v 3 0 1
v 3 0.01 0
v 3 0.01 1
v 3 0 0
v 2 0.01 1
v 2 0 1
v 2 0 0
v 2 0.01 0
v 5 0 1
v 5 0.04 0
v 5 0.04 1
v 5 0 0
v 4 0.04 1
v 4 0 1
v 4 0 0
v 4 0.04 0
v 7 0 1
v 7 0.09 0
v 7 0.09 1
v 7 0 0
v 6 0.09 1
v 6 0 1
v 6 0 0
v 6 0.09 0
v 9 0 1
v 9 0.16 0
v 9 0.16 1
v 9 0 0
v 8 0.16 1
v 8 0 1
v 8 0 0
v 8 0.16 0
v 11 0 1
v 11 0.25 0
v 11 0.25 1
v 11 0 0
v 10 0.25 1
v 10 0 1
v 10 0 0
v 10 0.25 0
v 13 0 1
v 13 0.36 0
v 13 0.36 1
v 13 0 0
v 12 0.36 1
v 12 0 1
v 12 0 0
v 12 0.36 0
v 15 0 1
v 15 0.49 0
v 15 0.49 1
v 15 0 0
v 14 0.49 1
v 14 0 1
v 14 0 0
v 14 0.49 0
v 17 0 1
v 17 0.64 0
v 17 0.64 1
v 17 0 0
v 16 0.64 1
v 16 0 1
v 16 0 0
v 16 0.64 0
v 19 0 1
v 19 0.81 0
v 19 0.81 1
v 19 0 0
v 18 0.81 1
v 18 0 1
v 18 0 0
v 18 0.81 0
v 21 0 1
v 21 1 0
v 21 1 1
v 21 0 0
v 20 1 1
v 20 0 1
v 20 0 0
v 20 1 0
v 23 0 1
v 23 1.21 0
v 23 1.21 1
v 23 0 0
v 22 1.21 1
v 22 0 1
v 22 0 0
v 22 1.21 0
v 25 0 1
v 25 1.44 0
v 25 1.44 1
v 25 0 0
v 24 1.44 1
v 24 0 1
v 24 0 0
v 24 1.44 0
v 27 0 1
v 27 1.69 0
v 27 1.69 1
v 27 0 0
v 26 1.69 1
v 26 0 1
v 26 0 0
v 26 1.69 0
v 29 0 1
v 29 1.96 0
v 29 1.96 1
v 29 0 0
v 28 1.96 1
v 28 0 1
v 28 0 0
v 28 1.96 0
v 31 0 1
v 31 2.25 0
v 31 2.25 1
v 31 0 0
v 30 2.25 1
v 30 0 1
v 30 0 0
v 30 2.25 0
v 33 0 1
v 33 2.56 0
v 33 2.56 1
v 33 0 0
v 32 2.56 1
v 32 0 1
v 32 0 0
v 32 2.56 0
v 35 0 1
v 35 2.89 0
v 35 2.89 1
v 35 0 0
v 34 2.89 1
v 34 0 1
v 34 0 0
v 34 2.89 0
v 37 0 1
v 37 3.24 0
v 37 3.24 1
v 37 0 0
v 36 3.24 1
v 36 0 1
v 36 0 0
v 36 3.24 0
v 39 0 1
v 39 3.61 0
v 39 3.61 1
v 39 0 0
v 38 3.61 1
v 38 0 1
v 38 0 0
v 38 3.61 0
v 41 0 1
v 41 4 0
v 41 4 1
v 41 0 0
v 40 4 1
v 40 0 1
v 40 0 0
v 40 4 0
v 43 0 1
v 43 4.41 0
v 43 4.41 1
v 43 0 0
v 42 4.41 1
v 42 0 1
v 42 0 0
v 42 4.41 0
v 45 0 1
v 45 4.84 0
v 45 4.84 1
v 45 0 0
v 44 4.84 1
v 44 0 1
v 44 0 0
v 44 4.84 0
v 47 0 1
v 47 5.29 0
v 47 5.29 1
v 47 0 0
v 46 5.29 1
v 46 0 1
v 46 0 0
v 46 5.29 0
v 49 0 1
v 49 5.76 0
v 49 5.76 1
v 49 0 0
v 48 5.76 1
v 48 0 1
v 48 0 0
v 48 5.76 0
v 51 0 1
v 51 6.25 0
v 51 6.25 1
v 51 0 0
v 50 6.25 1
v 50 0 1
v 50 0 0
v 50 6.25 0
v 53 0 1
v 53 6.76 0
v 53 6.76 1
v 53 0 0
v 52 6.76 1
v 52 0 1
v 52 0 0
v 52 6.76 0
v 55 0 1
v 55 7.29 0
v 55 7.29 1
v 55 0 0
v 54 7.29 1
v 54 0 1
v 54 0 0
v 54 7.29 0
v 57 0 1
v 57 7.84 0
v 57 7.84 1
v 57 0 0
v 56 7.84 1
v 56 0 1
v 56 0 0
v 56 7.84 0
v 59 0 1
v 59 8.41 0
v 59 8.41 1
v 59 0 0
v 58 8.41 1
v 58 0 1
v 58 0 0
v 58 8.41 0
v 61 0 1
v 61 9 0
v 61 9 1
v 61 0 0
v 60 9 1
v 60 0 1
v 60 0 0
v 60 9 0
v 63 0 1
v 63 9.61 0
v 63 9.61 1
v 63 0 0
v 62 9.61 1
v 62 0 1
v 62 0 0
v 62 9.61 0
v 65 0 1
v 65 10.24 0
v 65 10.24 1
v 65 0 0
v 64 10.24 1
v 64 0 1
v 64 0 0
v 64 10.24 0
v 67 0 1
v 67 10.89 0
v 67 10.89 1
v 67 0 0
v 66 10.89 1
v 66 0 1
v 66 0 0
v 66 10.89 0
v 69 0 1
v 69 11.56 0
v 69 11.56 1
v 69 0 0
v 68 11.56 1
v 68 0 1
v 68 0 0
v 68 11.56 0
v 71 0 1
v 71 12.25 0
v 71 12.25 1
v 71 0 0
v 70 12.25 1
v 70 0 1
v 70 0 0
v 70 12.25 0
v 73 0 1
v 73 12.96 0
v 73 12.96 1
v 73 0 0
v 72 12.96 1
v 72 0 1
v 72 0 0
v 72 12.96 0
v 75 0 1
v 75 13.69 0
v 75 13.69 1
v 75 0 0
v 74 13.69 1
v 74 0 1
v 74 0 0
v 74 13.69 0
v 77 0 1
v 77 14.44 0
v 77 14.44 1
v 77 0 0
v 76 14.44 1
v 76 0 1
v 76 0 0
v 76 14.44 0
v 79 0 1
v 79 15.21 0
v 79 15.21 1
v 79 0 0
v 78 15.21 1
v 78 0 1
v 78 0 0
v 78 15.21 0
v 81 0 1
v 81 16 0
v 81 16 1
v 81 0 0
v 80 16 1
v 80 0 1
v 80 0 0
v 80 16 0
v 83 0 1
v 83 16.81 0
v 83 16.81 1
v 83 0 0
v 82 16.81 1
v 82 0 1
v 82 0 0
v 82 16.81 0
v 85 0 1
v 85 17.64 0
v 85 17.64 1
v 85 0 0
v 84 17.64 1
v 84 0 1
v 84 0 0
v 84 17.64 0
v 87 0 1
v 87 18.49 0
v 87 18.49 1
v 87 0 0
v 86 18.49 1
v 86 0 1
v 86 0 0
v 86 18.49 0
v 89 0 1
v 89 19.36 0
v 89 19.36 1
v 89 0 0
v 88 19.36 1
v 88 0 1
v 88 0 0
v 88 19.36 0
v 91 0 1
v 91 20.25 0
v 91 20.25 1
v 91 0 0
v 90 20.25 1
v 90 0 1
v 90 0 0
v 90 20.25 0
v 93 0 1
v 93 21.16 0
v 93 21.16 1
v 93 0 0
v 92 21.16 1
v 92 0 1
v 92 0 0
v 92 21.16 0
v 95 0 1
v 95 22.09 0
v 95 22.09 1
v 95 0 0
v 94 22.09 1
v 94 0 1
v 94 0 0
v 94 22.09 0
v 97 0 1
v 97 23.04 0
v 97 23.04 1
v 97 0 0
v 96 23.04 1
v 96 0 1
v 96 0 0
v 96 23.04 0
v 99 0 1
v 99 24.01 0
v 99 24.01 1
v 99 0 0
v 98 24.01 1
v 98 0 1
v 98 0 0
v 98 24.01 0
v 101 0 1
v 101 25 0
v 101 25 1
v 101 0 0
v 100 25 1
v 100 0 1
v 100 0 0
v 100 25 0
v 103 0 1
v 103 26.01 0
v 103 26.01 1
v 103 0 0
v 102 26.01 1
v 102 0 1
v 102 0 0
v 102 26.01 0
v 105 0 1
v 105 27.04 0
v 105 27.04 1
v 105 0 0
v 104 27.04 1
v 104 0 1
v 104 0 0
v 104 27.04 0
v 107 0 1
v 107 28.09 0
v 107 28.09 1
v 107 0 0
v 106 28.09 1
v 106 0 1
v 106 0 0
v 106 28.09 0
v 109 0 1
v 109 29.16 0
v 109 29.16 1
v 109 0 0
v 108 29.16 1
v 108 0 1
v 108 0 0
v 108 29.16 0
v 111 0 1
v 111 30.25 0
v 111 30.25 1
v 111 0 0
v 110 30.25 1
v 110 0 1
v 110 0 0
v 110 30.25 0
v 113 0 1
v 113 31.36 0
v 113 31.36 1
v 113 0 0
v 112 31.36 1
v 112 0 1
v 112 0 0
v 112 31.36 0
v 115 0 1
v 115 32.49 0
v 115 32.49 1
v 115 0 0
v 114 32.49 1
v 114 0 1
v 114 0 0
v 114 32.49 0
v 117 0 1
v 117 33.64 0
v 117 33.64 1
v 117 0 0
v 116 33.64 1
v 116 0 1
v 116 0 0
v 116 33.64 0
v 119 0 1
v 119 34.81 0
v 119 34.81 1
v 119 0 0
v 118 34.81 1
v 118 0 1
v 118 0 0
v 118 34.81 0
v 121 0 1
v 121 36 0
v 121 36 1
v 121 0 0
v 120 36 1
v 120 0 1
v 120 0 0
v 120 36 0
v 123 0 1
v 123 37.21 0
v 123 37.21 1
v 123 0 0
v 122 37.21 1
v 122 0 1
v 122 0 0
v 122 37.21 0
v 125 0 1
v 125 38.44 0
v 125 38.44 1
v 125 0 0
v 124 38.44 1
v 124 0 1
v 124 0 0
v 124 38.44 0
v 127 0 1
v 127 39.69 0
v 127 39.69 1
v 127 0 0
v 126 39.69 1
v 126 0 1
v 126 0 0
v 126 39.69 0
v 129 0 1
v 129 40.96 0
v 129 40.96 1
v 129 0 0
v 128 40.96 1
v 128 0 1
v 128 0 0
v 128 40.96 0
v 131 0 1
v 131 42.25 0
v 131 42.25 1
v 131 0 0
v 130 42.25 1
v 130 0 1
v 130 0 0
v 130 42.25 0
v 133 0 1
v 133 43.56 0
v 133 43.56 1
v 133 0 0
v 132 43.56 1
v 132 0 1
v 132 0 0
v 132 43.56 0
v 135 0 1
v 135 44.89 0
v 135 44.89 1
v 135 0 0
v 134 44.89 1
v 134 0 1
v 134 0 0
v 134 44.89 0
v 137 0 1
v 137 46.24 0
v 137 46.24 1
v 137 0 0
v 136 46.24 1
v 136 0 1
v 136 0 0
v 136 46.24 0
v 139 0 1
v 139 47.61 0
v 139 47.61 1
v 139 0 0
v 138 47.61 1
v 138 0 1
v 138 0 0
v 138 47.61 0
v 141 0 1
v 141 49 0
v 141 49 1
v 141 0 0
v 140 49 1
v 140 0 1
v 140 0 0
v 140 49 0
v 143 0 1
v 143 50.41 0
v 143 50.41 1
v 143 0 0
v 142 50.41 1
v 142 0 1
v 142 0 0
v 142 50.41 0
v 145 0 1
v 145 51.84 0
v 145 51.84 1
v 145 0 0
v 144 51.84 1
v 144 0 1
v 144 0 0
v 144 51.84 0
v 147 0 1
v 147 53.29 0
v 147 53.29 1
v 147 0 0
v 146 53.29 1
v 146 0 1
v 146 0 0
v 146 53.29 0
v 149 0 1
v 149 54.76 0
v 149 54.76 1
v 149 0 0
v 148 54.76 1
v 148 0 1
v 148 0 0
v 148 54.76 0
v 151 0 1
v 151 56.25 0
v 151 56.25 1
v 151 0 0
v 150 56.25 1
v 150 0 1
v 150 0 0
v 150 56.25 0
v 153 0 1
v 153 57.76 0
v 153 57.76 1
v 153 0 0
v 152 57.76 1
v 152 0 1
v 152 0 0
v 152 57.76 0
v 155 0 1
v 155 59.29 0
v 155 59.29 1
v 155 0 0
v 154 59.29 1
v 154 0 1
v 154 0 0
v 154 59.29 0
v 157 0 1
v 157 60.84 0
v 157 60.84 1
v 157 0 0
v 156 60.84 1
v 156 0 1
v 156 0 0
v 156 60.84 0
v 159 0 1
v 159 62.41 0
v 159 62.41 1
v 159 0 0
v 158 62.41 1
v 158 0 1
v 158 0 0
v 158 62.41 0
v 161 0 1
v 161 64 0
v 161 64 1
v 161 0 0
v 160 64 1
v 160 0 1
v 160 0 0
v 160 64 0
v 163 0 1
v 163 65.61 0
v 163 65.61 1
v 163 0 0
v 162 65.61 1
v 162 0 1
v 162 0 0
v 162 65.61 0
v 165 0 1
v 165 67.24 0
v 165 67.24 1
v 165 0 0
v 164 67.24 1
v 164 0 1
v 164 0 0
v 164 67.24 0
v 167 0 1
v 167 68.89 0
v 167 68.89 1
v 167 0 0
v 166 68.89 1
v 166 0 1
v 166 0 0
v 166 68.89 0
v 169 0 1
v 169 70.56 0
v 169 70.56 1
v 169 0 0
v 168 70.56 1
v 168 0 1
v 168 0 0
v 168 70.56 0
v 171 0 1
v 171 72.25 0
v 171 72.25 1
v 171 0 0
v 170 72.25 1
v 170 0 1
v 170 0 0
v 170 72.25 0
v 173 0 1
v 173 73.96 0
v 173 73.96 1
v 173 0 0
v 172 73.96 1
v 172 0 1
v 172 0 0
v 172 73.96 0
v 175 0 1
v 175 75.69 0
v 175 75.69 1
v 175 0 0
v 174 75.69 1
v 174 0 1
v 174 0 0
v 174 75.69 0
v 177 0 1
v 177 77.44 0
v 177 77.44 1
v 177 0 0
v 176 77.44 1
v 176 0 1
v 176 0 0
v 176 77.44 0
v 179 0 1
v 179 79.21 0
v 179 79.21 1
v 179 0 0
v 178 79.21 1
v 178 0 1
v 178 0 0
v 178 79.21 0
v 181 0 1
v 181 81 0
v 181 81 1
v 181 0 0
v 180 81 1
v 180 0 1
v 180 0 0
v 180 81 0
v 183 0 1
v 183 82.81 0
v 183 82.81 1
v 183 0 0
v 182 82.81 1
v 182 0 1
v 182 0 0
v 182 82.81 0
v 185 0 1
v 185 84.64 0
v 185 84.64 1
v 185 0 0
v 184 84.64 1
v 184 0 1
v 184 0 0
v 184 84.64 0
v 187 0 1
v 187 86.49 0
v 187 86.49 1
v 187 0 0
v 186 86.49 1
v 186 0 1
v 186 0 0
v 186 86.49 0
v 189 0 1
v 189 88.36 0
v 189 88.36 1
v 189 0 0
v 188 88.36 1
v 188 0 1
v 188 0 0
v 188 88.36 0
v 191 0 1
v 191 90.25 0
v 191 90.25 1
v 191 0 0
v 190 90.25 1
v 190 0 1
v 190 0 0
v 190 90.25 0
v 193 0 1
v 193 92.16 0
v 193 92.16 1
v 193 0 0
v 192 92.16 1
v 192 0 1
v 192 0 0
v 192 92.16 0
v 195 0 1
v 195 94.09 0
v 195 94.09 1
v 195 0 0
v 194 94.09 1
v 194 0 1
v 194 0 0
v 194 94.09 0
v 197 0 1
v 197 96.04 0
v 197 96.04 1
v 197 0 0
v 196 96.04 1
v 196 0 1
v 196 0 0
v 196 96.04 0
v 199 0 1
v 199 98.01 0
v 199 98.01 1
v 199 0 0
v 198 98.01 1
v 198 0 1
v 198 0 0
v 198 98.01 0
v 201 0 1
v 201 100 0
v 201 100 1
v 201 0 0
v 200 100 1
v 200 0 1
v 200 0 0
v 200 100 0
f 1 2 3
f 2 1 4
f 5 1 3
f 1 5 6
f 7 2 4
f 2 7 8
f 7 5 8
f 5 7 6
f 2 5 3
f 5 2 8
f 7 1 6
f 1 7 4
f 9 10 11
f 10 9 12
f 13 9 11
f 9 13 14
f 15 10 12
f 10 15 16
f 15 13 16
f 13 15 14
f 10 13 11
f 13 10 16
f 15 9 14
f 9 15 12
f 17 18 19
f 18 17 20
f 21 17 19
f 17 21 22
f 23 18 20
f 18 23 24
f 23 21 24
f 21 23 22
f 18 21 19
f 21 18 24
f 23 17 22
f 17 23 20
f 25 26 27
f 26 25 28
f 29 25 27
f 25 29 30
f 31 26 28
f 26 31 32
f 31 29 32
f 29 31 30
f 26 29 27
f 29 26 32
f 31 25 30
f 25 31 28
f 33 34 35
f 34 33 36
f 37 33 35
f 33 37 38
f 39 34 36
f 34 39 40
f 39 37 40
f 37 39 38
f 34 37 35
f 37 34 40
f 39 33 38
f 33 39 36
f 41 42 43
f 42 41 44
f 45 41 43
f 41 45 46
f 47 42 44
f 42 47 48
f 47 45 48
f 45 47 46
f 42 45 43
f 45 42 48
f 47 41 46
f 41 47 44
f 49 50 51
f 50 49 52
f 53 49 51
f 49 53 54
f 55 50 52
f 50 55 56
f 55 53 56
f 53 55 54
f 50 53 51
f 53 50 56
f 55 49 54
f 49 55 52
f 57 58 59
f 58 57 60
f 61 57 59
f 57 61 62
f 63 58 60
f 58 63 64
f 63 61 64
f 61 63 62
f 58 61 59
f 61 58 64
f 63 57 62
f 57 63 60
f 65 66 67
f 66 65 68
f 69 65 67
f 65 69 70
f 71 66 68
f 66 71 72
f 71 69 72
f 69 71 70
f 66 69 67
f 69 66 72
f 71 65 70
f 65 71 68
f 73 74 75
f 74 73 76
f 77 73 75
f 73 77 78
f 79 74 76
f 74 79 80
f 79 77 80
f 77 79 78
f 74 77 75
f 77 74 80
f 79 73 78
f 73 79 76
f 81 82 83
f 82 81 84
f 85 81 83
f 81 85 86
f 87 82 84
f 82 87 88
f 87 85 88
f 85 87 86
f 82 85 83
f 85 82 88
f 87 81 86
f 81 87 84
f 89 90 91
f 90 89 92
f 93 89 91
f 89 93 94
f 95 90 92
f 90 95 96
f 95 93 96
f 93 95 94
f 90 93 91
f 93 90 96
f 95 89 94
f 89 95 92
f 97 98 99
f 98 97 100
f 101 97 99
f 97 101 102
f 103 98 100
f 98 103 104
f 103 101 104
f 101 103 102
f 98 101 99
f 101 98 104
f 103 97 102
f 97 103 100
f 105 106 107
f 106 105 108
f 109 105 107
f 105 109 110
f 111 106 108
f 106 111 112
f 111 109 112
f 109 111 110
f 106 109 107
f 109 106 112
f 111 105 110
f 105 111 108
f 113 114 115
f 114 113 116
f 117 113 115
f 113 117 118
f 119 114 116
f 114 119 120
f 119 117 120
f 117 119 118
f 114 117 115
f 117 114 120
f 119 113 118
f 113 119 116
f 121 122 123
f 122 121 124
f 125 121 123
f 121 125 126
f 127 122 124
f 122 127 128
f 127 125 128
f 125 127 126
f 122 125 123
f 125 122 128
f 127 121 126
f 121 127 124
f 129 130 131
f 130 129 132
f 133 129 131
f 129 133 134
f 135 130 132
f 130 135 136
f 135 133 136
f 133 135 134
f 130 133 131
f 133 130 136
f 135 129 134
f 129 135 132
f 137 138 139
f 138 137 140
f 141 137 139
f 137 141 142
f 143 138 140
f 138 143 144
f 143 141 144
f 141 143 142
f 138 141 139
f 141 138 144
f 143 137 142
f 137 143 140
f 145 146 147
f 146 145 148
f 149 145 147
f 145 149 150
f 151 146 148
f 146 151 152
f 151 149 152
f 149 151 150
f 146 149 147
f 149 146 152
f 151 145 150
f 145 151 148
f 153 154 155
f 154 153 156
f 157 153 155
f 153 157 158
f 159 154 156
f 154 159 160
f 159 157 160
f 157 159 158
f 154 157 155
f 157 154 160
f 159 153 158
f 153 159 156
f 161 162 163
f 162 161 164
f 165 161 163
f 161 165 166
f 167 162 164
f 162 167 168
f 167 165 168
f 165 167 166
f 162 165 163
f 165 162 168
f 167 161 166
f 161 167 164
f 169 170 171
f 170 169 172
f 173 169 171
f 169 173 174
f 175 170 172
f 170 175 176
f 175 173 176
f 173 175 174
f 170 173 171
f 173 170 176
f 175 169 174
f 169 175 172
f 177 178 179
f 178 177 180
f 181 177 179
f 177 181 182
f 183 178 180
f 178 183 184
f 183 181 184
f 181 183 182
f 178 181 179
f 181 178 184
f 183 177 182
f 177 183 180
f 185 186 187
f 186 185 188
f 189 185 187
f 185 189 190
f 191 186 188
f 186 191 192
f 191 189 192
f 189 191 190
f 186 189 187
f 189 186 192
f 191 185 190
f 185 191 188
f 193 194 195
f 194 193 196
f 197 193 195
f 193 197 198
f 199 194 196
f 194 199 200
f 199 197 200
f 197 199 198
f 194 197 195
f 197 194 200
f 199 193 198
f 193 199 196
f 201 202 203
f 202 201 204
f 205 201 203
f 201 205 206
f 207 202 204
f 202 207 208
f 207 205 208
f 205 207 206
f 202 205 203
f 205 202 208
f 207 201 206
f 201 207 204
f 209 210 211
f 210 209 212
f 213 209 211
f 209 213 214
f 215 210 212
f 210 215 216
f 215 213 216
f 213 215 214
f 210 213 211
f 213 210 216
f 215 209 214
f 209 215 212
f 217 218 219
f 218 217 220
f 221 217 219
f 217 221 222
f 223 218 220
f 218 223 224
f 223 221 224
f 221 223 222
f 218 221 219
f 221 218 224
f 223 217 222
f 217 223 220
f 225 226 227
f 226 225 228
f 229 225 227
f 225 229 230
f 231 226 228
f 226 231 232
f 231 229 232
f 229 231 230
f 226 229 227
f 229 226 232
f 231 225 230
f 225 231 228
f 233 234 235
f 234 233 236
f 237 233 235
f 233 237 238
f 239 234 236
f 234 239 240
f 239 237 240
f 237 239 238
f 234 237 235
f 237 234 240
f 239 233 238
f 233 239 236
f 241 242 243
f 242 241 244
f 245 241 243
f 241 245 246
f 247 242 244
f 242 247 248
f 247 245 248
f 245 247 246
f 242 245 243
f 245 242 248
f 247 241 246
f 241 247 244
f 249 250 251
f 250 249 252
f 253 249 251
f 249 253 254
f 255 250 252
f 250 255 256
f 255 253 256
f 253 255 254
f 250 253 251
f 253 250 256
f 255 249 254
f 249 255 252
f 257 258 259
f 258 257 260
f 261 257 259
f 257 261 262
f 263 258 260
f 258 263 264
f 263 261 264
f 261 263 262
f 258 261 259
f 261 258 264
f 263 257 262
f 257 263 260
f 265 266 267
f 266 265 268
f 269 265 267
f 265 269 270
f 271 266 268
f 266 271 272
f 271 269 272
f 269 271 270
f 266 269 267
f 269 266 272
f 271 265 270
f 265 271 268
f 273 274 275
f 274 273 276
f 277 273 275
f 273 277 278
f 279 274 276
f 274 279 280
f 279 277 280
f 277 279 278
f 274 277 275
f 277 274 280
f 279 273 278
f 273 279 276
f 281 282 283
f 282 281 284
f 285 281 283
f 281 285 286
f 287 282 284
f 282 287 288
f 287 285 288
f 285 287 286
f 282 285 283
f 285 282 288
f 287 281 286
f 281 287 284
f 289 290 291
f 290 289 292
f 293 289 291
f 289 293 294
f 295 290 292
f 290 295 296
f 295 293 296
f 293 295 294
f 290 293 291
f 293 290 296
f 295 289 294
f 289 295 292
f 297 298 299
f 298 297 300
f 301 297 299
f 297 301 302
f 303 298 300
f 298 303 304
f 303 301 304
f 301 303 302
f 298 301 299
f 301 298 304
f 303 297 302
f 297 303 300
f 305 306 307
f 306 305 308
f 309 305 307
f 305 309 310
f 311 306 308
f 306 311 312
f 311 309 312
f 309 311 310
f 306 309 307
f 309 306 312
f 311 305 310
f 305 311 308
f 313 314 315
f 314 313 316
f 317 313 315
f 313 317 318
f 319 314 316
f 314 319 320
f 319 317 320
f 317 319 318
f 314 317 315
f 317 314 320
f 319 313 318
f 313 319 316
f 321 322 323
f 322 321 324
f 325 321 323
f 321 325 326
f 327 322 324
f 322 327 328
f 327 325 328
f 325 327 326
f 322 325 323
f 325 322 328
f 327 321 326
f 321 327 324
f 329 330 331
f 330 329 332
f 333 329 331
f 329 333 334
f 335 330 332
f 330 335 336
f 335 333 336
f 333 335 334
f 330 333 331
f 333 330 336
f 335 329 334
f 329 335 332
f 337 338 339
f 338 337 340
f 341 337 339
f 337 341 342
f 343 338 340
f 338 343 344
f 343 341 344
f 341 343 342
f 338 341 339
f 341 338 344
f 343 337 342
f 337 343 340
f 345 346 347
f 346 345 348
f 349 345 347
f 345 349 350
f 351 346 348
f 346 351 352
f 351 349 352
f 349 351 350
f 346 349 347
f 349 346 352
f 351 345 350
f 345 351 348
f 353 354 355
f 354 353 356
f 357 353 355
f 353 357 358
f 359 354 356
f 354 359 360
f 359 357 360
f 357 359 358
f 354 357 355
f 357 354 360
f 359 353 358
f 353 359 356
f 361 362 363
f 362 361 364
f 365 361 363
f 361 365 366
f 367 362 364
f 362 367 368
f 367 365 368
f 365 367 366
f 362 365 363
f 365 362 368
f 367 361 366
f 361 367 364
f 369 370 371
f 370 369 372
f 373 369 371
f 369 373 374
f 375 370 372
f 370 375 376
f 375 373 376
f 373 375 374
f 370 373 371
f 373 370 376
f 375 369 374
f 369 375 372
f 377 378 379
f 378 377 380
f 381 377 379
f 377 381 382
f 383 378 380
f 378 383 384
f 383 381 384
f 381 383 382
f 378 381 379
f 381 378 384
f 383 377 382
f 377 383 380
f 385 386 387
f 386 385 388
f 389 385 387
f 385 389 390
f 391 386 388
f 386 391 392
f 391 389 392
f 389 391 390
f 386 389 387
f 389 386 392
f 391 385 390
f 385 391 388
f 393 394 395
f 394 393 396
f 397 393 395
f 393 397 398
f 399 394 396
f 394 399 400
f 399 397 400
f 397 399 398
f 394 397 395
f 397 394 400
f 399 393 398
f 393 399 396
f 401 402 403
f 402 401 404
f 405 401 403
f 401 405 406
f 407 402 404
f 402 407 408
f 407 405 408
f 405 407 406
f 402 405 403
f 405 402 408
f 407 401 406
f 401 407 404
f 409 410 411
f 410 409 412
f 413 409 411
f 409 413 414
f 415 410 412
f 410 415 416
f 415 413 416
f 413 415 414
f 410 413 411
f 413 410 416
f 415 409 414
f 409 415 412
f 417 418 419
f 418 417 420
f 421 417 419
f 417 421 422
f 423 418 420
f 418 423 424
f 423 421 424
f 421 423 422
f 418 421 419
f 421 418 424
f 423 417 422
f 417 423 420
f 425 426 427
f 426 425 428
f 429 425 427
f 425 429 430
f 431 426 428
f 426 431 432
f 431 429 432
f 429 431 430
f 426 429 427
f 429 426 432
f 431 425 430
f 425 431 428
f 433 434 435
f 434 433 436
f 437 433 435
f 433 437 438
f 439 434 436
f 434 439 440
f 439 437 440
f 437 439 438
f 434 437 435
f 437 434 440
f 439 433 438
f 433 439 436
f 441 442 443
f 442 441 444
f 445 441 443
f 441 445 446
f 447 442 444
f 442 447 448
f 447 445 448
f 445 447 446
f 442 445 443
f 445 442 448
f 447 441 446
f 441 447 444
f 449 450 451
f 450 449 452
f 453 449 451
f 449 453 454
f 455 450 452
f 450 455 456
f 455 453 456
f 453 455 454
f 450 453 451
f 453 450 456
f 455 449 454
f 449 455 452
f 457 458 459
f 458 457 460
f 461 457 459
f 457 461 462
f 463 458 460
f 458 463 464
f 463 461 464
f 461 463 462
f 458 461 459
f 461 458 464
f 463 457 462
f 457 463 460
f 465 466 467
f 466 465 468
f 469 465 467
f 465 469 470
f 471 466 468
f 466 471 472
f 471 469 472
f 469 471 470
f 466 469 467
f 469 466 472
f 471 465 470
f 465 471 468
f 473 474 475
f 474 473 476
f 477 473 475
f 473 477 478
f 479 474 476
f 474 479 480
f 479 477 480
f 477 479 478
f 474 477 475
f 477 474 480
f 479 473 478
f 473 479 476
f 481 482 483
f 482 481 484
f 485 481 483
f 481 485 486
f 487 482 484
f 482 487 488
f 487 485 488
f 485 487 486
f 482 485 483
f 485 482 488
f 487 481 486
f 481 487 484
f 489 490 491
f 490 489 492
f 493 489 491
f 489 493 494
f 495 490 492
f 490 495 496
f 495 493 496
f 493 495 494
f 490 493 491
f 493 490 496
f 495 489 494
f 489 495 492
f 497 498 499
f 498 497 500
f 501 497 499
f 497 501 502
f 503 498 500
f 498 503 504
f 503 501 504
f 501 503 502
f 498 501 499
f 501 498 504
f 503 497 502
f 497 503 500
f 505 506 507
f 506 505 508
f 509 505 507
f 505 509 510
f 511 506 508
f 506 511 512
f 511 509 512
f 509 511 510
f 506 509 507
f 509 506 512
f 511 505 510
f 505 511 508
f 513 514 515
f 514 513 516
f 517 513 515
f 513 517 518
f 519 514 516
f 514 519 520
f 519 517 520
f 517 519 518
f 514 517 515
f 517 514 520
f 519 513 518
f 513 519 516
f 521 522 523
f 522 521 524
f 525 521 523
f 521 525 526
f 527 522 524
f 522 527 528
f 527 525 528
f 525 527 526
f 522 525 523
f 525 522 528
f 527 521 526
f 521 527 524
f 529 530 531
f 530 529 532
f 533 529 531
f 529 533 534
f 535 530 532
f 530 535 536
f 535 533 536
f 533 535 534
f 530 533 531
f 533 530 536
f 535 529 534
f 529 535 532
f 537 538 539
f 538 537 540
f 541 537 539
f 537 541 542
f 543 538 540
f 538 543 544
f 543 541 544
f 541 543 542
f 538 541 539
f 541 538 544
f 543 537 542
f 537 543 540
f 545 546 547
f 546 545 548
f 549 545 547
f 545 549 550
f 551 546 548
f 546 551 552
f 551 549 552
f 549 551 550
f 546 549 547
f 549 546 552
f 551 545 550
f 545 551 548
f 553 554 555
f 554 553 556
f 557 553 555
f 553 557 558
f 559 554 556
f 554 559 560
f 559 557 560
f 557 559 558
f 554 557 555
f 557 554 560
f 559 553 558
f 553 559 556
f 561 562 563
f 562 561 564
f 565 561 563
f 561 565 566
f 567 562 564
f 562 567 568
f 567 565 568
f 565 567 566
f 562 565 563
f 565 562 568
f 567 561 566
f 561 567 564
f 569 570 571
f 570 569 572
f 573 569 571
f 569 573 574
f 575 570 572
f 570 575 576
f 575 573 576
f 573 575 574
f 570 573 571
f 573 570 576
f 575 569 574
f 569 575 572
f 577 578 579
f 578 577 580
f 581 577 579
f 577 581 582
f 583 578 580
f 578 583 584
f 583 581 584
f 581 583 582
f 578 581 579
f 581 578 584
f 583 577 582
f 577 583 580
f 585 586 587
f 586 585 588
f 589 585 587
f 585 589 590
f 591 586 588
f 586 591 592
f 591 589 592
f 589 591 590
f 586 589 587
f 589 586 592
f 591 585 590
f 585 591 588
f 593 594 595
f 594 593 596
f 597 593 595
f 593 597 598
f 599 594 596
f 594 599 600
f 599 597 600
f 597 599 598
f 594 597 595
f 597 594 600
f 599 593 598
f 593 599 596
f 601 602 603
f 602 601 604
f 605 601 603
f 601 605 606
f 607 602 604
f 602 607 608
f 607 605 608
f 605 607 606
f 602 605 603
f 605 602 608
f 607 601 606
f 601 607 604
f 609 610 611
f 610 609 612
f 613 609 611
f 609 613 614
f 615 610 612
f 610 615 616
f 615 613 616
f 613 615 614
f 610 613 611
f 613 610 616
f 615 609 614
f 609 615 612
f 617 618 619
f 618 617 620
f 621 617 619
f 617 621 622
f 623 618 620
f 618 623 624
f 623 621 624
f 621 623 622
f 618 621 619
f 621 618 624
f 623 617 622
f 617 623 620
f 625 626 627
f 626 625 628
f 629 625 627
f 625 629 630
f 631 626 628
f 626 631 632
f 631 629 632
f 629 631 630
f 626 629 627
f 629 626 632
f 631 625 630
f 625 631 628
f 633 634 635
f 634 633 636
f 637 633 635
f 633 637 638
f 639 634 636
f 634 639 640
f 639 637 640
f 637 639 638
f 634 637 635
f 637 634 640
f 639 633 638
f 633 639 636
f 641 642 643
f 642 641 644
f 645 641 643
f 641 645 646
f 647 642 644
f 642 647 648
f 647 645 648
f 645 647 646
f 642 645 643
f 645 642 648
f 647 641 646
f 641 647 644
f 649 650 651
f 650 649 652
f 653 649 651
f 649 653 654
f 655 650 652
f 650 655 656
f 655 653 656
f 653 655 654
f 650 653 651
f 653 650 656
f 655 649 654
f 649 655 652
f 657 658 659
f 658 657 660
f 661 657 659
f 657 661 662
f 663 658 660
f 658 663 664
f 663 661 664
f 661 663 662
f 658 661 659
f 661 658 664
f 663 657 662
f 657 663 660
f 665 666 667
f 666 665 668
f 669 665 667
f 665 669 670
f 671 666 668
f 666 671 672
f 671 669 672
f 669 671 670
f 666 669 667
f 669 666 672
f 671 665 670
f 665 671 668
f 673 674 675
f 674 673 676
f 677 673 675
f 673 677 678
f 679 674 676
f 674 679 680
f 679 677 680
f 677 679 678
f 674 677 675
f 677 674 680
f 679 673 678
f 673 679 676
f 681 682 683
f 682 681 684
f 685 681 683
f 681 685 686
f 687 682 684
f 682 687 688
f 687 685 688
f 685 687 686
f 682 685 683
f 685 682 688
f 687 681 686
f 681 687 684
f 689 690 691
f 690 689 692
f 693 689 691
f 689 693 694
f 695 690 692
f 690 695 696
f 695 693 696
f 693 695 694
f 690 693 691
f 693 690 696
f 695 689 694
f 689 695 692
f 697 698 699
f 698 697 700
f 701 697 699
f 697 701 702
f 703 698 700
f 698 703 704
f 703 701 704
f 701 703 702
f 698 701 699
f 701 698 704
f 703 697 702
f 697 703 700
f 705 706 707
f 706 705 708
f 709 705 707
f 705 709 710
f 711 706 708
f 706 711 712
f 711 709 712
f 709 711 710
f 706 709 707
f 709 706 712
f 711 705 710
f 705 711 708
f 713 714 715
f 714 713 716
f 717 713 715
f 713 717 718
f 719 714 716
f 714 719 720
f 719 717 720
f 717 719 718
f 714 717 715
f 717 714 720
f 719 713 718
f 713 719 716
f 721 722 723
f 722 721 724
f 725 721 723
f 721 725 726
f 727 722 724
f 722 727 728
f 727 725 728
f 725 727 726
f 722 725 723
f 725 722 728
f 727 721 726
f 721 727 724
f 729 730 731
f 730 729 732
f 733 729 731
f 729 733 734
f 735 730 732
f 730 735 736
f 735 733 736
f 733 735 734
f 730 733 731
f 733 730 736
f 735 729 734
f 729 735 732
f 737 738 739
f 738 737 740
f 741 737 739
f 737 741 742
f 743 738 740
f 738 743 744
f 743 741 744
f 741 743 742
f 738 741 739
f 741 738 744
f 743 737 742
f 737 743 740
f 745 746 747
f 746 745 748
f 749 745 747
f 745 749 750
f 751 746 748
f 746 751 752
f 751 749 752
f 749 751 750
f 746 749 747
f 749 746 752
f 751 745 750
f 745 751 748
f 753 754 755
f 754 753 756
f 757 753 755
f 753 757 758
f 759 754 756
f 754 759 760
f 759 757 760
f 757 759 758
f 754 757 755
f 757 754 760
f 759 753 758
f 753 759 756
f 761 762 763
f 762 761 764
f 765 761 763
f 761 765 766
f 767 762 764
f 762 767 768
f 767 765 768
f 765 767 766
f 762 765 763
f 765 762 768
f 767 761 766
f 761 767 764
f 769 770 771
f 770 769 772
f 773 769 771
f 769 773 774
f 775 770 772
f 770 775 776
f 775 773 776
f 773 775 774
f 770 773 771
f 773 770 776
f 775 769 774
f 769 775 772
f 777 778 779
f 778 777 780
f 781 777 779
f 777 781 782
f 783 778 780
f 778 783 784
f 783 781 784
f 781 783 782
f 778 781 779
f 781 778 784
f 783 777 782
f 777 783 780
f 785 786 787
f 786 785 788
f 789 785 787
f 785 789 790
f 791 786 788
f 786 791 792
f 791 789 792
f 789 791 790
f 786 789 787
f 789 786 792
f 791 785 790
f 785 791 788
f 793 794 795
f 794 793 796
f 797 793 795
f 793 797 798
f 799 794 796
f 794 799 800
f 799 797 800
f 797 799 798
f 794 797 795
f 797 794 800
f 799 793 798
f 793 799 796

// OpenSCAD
//------------------------------------------------------------------------------------------
// THIS CODE WAS GENERATED WITH GRAPHSCAD
//------------------------------------------------------------------------------------------
// F:/workspace/graphscad/graphscadfiles/variabledemo.scad
//------------------------------------------------------------------------------------------
// Graphscad is a graphical nodal editor to create .SCAD files
//
// More info here : http://graphscad.free.fr
//
// Scad Files created with Graphscad can be edited by graphscad
// Scad Files created with Graphscad can be read by Openscad
//
//------------------------------------------------------------------------------------------
module variabledemo()
{
 function node_variable_matrix(i=0,j=0,k=0,l=0,m=0,n=0) = node_variable0_matrix(i=i,j=j,k=k,l=l,m=m,n=n);
 module node_variable(i=0,j=0,k=0,l=0,m=0,n=0)
 {
  {
   $a=i;
   node_variable0(i,j,k,l,m,n);
  }
 }
 function node_variable0_matrix(i=0,j=0,k=0,l=0,m=0,n=0) = node_cube_matrix(i=i,j=j,k=k,l=l,m=m,n=n);
 module node_variable0(i=0,j=0,k=0,l=0,m=0,n=0)
 {
  {
   $b=$a/10*$a/10;
   node_cube(i,j,k,l,m,n);
  }
 }
 function node_cube_matrix(i=0,j=0,k=0,l=0,m=0,n=0) = translate([i*2,0,0]);
 module node_cube(i=0,j=0,k=0,l=0,m=0,n=0)
 {
  translate([i*2,0,0])cube([1,$b,1],center=false);
 }
 function node_for_matrix(i=0,j=0,k=0,l=0,m=0,n=0) = node_variable_matrix(i=i,j=j,k=k,l=l,m=m,n=n);
 module node_for(i=0,j=0,k=0,l=0,m=0,n=0)
 {
  for(i=[0:1:100])
  {
   node_variable(i,j,k,l,m,n);
  }
 }
 node_for();
 /*--------------------------------------------------------------------------------------------------------
  Graphscad Utils functions
  This code is Used By Graphscad Nodal Editor to generate SCAD files
 --------------------------------------------------------------------------------------------------------*/
 function det4x4(a) =
 a[0][0]*a[1][1]*a[2][2]*a[3][3] + a[0][0]*a[1][2]*a[2][3]*a[3][1] + a[0][0]*a[1][3]*a[2][1]*a[3][2]
 + a[0][1]*a[1][0]*a[2][3]*a[3][2] + a[0][1]*a[1][2]*a[2][0]*a[3][3] + a[0][1]*a[1][3]*a[2][2]*a[3][0]
 + a[0][2]*a[1][0]*a[2][1]*a[3][3] + a[0][2]*a[1][1]*a[2][3]*a[3][0] + a[0][2]*a[1][3]*a[2][0]*a[3][1]
 + a[0][3]*a[1][0]*a[2][2]*a[3][1] + a[0][3]*a[1][1]*a[2][0]*a[3][2] + a[0][3]*a[1][2]*a[2][1]*a[3][0]
 - a[0][0]*a[1][1]*a[2][3]*a[3][2] - a[0][0]*a[1][2]*a[2][1]*a[3][3] - a[0][0]*a[1][3]*a[2][2]*a[3][1]
 - a[0][1]*a[1][0]*a[2][2]*a[3][3] - a[0][1]*a[1][2]*a[2][3]*a[3][0] - a[0][1]*a[1][3]*a[2][0]*a[3][2]
 - a[0][2]*a[1][0]*a[2][3]*a[3][1] - a[0][2]*a[1][1]*a[2][0]*a[3][3] - a[0][2]*a[1][3]*a[2][1]*a[3][0]
 - a[0][3]*a[1][0]*a[2][1]*a[3][2] - a[0][3]*a[1][1]*a[2][2]*a[3][0] - a[0][3]*a[1][2]*a[2][0]*a[3][1];
 function invb00(a) = a[1][1]*a[2][2]*a[3][3] + a[1][2]*a[2][3]*a[3][1] + a[1][3]*a[2][1]*a[3][2] - a[1][1]*a[2][3]*a[3][2] - a[1][2]*a[2][1]*a[3][3] - a[1][3]*a[2][2]*a[3][1];
 function invb01(a) = a[0][1]*a[2][3]*a[3][2] + a[0][2]*a[2][1]*a[3][3] + a[0][3]*a[2][2]*a[3][1] - a[0][1]*a[2][2]*a[3][3] - a[0][2]*a[2][3]*a[3][1] - a[0][3]*a[2][1]*a[3][2];
 function invb02(a) = a[0][1]*a[1][2]*a[3][3] + a[0][2]*a[1][3]*a[3][1] + a[0][3]*a[1][1]*a[3][2] - a[0][1]*a[1][3]*a[3][2] - a[0][2]*a[1][1]*a[3][3] - a[0][3]*a[1][2]*a[3][1];
 function invb03(a) = a[0][1]*a[1][3]*a[2][2] + a[0][2]*a[1][1]*a[2][3] + a[0][3]*a[1][2]*a[2][1] - a[0][1]*a[1][2]*a[2][3] - a[0][2]*a[1][3]*a[2][1] - a[0][3]*a[1][1]*a[2][2];
 function invb10(a) = a[1][0]*a[2][3]*a[3][2] + a[1][2]*a[2][0]*a[3][3] + a[1][3]*a[2][2]*a[3][0] - a[1][0]*a[2][2]*a[3][3] - a[1][2]*a[2][3]*a[3][0] - a[1][3]*a[2][0]*a[3][2];
 function invb11(a) = a[0][0]*a[2][2]*a[3][3] + a[0][2]*a[2][3]*a[3][0] + a[0][3]*a[2][0]*a[3][2] - a[0][0]*a[2][3]*a[3][2] - a[0][2]*a[2][0]*a[3][3] - a[0][3]*a[2][2]*a[3][0];
 function invb12(a) = a[0][0]*a[1][3]*a[3][2] + a[0][2]*a[1][0]*a[3][3] + a[0][3]*a[1][2]*a[3][0] - a[0][0]*a[1][2]*a[3][3] - a[0][2]*a[1][3]*a[3][0] - a[0][3]*a[1][0]*a[3][2];
 function invb13(a) = a[0][0]*a[1][2]*a[2][3] + a[0][2]*a[1][3]*a[2][0] + a[0][3]*a[1][0]*a[2][2] - a[0][0]*a[1][3]*a[2][2] - a[0][2]*a[1][0]*a[2][3] - a[0][3]*a[1][2]*a[2][0];
 function invb20(a) = a[1][0]*a[2][1]*a[3][3] + a[1][1]*a[2][3]*a[3][0] + a[1][3]*a[2][0]*a[3][1] - a[1][0]*a[2][3]*a[3][1] - a[1][1]*a[2][0]*a[3][3] - a[1][3]*a[2][1]*a[3][0];
 function invb21(a) = a[0][0]*a[2][3]*a[3][1] + a[0][1]*a[2][0]*a[3][3] + a[0][3]*a[2][1]*a[3][0] - a[0][0]*a[2][1]*a[3][3] - a[0][1]*a[2][3]*a[3][0] - a[0][3]*a[2][0]*a[3][1];
 function invb22(a) = a[0][0]*a[1][1]*a[3][3] + a[0][1]*a[1][3]*a[3][0] + a[0][3]*a[1][0]*a[3][1] - a[0][0]*a[1][3]*a[3][1] - a[0][1]*a[1][0]*a[3][3] - a[0][3]*a[1][1]*a[3][0];
 function invb23(a) = a[0][0]*a[1][3]*a[2][1] + a[0][1]*a[1][0]*a[2][3] + a[0][3]*a[1][1]*a[2][0] - a[0][0]*a[1][1]*a[2][3] - a[0][1]*a[1][3]*a[2][0] - a[0][3]*a[1][0]*a[2][1];
 function invb30(a) = a[1][0]*a[2][2]*a[3][1] + a[1][1]*a[2][0]*a[3][2] + a[1][2]*a[2][1]*a[3][0] - a[1][0]*a[2][1]*a[3][2] - a[1][1]*a[2][2]*a[3][0] - a[1][2]*a[2][0]*a[3][1];
 function invb31(a) = a[0][0]*a[2][1]*a[3][2] + a[0][1]*a[2][2]*a[3][0] + a[0][2]*a[2][0]*a[3][1] - a[0][0]*a[2][2]*a[3][1] - a[0][1]*a[2][0]*a[3][2] - a[0][2]*a[2][1]*a[3][0];
 function invb32(a) = a[0][0]*a[1][2]*a[3][1] + a[0][1]*a[1][0]*a[3][2] + a[0][2]*a[1][1]*a[3][0] - a[0][0]*a[1][1]*a[3][2] - a[0][1]*a[1][2]*a[3][0] - a[0][2]*a[1][0]*a[3][1];
 function invb33(a) = a[0][0]*a[1][1]*a[2][2] + a[0][1]*a[1][2]*a[2][0] + a[0][2]*a[1][0]*a[2][1] - a[0][0]*a[1][2]*a[2][1] - a[0][1]*a[1][0]*a[2][2] - a[0][2]*a[1][1]*a[2][0];
 function inv4x4(a)= (1/det4x4(a))*[
 [invb00(a),invb01(a),invb02(a),invb03(a)],
 [invb10(a),invb11(a),invb12(a),invb13(a)],
 [invb20(a),invb21(a),invb22(a),invb23(a)],
 [invb30(a),invb31(a),invb32(a),invb33(a)]];
 function onlytranslate(a)=  [
                        [1,0,0,a[0][3]],
                        [0,1,0,a[1][3]],
                        [0,0,1,a[2][3]],
                        [0,0,0,1]];
 function negonlytranslate(a)=[
                        [1,0,0,-a[0][3]],
                        [0,1,0,-a[1][3]],
                        [0,0,1,-a[2][3]],
                        [0,0,0,1]];
 function lookatvec(t,parentmat) = [t[0]-parentmat[0][3],
                                 t[1]-parentmat[1][3],
                                 t[2]-parentmat[2][3]];
 /*
              rx = '0'
              ry = 'acos('+tz+'/norm(['+tx+','+ty+','+tz+']))'
              rz = 'atan2('+ty+','+tx+')'
 */
 function lookatrot(t,parentmat) = [0,
                                 acos((t[2]-parentmat[2][3])/norm(lookatvec(t,parentmat))),
                                 atan2(t[1]-parentmat[1][3],t[0]-parentmat[0][3])];
 function gettranslation(m) = [m[0][3],m[1][3],m[2][3]];
 function vectormulmatrix(v,m) = m*v;
 function vectorlength(v) = norm(v);
 function vectorx(v) = v[0];
 function vectory(v) = v[1];
 function vectorz(v) = v[2];
 function vectoradd(a,b) = (a+b);
 function vectorsub(a,b) = (a-b);
 function vectormul(a,b) = (a*b);
 function vectordiv(a,b) = (a*(1/b));
 function scale(v)=[[v[0],0,0,0],
                    [0,v[1],0,0],
                    [0,0,v[2],0],
                    [0,0,0,1]];
 function rotatex(a)=[[1,0,0,0],
                      [0,cos(a),-sin(a),0],
                      [0,sin(a),cos(a),0],
                      [0,0,0,1]];
 function rotatey(a)=[[cos(a),0,sin(a),0],
                      [0,1,0,0],
                      [-sin(a),0,cos(a),0],
                      [0,0,0,1]];
 function rotatez(a)=[[cos(a),-sin(a),0,0],
                      [sin(a),cos(a),0,0],
                      [0,0,1,0],
                      [0,0,0,1]];
 function rotatea(c,s,l,m,n)=[[l*l*(1-c)+c,m*l*(1-c)-n*s,n*l*(1-c)+m*s,0],
                              [l*m*(1-c)+n*s,m*m*(1-c)+c,n*m*(1-c)-l*s,0],
                              [l*n*(1-c)-m*s,m*n*(1-c)+l*s,n*n*(1-c)+c,0],
                              [0,0,0,1]];
 function rotateanv(a,nv)=rotatea(cos(a),sin(a),nv[0],nv[1],nv[2]);
 function rotate(a,v, normV=true)=(v==undef)?rotatez(a[2])*rotatey(a[1])*rotatex(a[0]):
                      normV ? rotateanv(a,v/sqrt(v*v)) : rotateanv(a,v);
 function translate(v)=[[1,0,0,v[0]],
                        [0,1,0,v[1]],
                        [0,0,1,v[2]],
                        [0,0,0,1]];
 function mirrorabc(a,b,c)=[[1-2*a*a,-2*a*b,-2*a*c,0],
                            [-2*a*b,1-2*b*b,-2*b*c,0],
                            [-2*a*c,-2*b*c,1-2*c*c,0],
                            [0,0,0,1]];
 function mirrornv(nv)=mirrorabc(nv[0],nv[1],nv[2]);
 function mirror(v)=mirrornv(v/sqrt(v*v));
}
variabledemo();


/*BEGINGRAPHSCAD{
    "nodes": [
        {
            "name": "node_variable",
            "inputplugs": [
                {
                    "tip": "input 3D object",
                    "connection": "node_variable0.object",
                    "type": "object",
                    "name": "object",
                    "value": ""
                },
                {
                    "tip": "vame of variable to declare",
                    "prefix": "$",
                    "type": "str",
                    "name": "name",
                    "value": "$a"
                },
                {
                    "tip": "expression of variable value",
                    "type": "str",
                    "name": "expression",
                    "value": "i"
                }
            ],
            "typename": "Node_variable",
            "version": 1,
            "y": -186.54852588071856,
            "x": -88.34346816383209
        },
        {
            "name": "node_variable0",
            "inputplugs": [
                {
                    "tip": "input 3D object",
                    "connection": "node_cube.object",
                    "type": "object",
                    "name": "object",
                    "value": ""
                },
                {
                    "tip": "vame of variable to declare",
                    "prefix": "$",
                    "type": "str",
                    "name": "name",
                    "value": "$b"
                },
                {
                    "tip": "expression of variable value",
                    "type": "str",
                    "name": "expression",
                    "value": "$a/10*$a/10"
                }
            ],
            "typename": "Node_variable",
            "version": 1,
            "y": -195.38770271103238,
            "x": -241.78160110524658
        },
        {
            "name": "node_cube",
            "inputplugs": [
                {
                    "tip": "x size of cube",
                    "type": "str",
                    "name": "sizex",
                    "value": "1"
                },
                {
                    "tip": "y size of cube",
                    "type": "str",
                    "name": "sizey",
                    "value": "$b"
                },
                {
                    "tip": "z size of cube",
                    "type": "str",
                    "name": "sizez",
                    "value": "1"
                },
                {
                    "tip": "x translation of output object",
                    "type": "str",
                    "name": "tx",
                    "value": "i*2"
                },
                {
                    "tip": "y translation of output object",
                    "type": "str",
                    "name": "ty",
                    "value": "0"
                },
                {
                    "tip": "z translation of output object",
                    "type": "str",
                    "name": "tz",
                    "value": "0"
                },
                {
                    "tip": "centering of cube",
                    "type": "str",
                    "name": "center",
                    "value": "false",
                    "combo": [
                        "true",
                        "false"
                    ]
                }
            ],
            "typename": "Node_cube",
            "version": 1,
            "y": -213.97243876407185,
            "x": -456.2190565480241
        },
        {
            "name": "node_for",
            "inputplugs": [
                {
                    "tip": "input object",
                    "connection": "node_variable.object",
                    "type": "object",
                    "name": "object",
                    "value": ""
                },
                {
                    "tip": "name of variable that will change during loop",
                    "type": "str",
                    "name": "variablename",
                    "value": "i",
                    "combo": [
                        "i",
                        "j",
                        "k",
                        "l",
                        "m",
                        "n"
                    ]
                },
                {
                    "tip": "start value of variable used in loop",
                    "type": "str",
                    "name": "start",
                    "value": "0"
                },
                {
                    "tip": "target value of variable used in loop",
                    "type": "str",
                    "name": "end",
                    "value": "100"
                },
                {
                    "tip": "increment of variable for each loop",
                    "type": "str",
                    "name": "step",
                    "value": "1"
                }
            ],
            "typename": "Node_for",
            "version": 1,
            "y": -170.54709830514975,
            "x": 159.2042733758082
        }
    ],
    "version": 2
}ENDGRAPHSCAD*/
